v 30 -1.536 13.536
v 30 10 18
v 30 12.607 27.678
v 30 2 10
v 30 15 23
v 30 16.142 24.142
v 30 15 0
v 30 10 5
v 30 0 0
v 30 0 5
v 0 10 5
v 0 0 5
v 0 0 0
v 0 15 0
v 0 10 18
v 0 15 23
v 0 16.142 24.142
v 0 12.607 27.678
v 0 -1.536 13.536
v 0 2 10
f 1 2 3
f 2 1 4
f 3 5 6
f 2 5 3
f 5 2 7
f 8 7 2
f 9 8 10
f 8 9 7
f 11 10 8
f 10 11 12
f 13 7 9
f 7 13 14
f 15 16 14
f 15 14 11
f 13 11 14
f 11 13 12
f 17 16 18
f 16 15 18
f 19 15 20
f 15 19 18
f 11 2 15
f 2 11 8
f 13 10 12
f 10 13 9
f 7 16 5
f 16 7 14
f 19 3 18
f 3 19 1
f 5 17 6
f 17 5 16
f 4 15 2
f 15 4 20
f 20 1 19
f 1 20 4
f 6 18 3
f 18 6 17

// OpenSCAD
cube([30, 10, 5]);
translate([0, 10, 0]) {
	cube([30, 5, 25]);
}
translate([0, 2, 10]) {
	rotate([45, 0, 0]) {
		cube([30, 20, 5]);
	}
}
